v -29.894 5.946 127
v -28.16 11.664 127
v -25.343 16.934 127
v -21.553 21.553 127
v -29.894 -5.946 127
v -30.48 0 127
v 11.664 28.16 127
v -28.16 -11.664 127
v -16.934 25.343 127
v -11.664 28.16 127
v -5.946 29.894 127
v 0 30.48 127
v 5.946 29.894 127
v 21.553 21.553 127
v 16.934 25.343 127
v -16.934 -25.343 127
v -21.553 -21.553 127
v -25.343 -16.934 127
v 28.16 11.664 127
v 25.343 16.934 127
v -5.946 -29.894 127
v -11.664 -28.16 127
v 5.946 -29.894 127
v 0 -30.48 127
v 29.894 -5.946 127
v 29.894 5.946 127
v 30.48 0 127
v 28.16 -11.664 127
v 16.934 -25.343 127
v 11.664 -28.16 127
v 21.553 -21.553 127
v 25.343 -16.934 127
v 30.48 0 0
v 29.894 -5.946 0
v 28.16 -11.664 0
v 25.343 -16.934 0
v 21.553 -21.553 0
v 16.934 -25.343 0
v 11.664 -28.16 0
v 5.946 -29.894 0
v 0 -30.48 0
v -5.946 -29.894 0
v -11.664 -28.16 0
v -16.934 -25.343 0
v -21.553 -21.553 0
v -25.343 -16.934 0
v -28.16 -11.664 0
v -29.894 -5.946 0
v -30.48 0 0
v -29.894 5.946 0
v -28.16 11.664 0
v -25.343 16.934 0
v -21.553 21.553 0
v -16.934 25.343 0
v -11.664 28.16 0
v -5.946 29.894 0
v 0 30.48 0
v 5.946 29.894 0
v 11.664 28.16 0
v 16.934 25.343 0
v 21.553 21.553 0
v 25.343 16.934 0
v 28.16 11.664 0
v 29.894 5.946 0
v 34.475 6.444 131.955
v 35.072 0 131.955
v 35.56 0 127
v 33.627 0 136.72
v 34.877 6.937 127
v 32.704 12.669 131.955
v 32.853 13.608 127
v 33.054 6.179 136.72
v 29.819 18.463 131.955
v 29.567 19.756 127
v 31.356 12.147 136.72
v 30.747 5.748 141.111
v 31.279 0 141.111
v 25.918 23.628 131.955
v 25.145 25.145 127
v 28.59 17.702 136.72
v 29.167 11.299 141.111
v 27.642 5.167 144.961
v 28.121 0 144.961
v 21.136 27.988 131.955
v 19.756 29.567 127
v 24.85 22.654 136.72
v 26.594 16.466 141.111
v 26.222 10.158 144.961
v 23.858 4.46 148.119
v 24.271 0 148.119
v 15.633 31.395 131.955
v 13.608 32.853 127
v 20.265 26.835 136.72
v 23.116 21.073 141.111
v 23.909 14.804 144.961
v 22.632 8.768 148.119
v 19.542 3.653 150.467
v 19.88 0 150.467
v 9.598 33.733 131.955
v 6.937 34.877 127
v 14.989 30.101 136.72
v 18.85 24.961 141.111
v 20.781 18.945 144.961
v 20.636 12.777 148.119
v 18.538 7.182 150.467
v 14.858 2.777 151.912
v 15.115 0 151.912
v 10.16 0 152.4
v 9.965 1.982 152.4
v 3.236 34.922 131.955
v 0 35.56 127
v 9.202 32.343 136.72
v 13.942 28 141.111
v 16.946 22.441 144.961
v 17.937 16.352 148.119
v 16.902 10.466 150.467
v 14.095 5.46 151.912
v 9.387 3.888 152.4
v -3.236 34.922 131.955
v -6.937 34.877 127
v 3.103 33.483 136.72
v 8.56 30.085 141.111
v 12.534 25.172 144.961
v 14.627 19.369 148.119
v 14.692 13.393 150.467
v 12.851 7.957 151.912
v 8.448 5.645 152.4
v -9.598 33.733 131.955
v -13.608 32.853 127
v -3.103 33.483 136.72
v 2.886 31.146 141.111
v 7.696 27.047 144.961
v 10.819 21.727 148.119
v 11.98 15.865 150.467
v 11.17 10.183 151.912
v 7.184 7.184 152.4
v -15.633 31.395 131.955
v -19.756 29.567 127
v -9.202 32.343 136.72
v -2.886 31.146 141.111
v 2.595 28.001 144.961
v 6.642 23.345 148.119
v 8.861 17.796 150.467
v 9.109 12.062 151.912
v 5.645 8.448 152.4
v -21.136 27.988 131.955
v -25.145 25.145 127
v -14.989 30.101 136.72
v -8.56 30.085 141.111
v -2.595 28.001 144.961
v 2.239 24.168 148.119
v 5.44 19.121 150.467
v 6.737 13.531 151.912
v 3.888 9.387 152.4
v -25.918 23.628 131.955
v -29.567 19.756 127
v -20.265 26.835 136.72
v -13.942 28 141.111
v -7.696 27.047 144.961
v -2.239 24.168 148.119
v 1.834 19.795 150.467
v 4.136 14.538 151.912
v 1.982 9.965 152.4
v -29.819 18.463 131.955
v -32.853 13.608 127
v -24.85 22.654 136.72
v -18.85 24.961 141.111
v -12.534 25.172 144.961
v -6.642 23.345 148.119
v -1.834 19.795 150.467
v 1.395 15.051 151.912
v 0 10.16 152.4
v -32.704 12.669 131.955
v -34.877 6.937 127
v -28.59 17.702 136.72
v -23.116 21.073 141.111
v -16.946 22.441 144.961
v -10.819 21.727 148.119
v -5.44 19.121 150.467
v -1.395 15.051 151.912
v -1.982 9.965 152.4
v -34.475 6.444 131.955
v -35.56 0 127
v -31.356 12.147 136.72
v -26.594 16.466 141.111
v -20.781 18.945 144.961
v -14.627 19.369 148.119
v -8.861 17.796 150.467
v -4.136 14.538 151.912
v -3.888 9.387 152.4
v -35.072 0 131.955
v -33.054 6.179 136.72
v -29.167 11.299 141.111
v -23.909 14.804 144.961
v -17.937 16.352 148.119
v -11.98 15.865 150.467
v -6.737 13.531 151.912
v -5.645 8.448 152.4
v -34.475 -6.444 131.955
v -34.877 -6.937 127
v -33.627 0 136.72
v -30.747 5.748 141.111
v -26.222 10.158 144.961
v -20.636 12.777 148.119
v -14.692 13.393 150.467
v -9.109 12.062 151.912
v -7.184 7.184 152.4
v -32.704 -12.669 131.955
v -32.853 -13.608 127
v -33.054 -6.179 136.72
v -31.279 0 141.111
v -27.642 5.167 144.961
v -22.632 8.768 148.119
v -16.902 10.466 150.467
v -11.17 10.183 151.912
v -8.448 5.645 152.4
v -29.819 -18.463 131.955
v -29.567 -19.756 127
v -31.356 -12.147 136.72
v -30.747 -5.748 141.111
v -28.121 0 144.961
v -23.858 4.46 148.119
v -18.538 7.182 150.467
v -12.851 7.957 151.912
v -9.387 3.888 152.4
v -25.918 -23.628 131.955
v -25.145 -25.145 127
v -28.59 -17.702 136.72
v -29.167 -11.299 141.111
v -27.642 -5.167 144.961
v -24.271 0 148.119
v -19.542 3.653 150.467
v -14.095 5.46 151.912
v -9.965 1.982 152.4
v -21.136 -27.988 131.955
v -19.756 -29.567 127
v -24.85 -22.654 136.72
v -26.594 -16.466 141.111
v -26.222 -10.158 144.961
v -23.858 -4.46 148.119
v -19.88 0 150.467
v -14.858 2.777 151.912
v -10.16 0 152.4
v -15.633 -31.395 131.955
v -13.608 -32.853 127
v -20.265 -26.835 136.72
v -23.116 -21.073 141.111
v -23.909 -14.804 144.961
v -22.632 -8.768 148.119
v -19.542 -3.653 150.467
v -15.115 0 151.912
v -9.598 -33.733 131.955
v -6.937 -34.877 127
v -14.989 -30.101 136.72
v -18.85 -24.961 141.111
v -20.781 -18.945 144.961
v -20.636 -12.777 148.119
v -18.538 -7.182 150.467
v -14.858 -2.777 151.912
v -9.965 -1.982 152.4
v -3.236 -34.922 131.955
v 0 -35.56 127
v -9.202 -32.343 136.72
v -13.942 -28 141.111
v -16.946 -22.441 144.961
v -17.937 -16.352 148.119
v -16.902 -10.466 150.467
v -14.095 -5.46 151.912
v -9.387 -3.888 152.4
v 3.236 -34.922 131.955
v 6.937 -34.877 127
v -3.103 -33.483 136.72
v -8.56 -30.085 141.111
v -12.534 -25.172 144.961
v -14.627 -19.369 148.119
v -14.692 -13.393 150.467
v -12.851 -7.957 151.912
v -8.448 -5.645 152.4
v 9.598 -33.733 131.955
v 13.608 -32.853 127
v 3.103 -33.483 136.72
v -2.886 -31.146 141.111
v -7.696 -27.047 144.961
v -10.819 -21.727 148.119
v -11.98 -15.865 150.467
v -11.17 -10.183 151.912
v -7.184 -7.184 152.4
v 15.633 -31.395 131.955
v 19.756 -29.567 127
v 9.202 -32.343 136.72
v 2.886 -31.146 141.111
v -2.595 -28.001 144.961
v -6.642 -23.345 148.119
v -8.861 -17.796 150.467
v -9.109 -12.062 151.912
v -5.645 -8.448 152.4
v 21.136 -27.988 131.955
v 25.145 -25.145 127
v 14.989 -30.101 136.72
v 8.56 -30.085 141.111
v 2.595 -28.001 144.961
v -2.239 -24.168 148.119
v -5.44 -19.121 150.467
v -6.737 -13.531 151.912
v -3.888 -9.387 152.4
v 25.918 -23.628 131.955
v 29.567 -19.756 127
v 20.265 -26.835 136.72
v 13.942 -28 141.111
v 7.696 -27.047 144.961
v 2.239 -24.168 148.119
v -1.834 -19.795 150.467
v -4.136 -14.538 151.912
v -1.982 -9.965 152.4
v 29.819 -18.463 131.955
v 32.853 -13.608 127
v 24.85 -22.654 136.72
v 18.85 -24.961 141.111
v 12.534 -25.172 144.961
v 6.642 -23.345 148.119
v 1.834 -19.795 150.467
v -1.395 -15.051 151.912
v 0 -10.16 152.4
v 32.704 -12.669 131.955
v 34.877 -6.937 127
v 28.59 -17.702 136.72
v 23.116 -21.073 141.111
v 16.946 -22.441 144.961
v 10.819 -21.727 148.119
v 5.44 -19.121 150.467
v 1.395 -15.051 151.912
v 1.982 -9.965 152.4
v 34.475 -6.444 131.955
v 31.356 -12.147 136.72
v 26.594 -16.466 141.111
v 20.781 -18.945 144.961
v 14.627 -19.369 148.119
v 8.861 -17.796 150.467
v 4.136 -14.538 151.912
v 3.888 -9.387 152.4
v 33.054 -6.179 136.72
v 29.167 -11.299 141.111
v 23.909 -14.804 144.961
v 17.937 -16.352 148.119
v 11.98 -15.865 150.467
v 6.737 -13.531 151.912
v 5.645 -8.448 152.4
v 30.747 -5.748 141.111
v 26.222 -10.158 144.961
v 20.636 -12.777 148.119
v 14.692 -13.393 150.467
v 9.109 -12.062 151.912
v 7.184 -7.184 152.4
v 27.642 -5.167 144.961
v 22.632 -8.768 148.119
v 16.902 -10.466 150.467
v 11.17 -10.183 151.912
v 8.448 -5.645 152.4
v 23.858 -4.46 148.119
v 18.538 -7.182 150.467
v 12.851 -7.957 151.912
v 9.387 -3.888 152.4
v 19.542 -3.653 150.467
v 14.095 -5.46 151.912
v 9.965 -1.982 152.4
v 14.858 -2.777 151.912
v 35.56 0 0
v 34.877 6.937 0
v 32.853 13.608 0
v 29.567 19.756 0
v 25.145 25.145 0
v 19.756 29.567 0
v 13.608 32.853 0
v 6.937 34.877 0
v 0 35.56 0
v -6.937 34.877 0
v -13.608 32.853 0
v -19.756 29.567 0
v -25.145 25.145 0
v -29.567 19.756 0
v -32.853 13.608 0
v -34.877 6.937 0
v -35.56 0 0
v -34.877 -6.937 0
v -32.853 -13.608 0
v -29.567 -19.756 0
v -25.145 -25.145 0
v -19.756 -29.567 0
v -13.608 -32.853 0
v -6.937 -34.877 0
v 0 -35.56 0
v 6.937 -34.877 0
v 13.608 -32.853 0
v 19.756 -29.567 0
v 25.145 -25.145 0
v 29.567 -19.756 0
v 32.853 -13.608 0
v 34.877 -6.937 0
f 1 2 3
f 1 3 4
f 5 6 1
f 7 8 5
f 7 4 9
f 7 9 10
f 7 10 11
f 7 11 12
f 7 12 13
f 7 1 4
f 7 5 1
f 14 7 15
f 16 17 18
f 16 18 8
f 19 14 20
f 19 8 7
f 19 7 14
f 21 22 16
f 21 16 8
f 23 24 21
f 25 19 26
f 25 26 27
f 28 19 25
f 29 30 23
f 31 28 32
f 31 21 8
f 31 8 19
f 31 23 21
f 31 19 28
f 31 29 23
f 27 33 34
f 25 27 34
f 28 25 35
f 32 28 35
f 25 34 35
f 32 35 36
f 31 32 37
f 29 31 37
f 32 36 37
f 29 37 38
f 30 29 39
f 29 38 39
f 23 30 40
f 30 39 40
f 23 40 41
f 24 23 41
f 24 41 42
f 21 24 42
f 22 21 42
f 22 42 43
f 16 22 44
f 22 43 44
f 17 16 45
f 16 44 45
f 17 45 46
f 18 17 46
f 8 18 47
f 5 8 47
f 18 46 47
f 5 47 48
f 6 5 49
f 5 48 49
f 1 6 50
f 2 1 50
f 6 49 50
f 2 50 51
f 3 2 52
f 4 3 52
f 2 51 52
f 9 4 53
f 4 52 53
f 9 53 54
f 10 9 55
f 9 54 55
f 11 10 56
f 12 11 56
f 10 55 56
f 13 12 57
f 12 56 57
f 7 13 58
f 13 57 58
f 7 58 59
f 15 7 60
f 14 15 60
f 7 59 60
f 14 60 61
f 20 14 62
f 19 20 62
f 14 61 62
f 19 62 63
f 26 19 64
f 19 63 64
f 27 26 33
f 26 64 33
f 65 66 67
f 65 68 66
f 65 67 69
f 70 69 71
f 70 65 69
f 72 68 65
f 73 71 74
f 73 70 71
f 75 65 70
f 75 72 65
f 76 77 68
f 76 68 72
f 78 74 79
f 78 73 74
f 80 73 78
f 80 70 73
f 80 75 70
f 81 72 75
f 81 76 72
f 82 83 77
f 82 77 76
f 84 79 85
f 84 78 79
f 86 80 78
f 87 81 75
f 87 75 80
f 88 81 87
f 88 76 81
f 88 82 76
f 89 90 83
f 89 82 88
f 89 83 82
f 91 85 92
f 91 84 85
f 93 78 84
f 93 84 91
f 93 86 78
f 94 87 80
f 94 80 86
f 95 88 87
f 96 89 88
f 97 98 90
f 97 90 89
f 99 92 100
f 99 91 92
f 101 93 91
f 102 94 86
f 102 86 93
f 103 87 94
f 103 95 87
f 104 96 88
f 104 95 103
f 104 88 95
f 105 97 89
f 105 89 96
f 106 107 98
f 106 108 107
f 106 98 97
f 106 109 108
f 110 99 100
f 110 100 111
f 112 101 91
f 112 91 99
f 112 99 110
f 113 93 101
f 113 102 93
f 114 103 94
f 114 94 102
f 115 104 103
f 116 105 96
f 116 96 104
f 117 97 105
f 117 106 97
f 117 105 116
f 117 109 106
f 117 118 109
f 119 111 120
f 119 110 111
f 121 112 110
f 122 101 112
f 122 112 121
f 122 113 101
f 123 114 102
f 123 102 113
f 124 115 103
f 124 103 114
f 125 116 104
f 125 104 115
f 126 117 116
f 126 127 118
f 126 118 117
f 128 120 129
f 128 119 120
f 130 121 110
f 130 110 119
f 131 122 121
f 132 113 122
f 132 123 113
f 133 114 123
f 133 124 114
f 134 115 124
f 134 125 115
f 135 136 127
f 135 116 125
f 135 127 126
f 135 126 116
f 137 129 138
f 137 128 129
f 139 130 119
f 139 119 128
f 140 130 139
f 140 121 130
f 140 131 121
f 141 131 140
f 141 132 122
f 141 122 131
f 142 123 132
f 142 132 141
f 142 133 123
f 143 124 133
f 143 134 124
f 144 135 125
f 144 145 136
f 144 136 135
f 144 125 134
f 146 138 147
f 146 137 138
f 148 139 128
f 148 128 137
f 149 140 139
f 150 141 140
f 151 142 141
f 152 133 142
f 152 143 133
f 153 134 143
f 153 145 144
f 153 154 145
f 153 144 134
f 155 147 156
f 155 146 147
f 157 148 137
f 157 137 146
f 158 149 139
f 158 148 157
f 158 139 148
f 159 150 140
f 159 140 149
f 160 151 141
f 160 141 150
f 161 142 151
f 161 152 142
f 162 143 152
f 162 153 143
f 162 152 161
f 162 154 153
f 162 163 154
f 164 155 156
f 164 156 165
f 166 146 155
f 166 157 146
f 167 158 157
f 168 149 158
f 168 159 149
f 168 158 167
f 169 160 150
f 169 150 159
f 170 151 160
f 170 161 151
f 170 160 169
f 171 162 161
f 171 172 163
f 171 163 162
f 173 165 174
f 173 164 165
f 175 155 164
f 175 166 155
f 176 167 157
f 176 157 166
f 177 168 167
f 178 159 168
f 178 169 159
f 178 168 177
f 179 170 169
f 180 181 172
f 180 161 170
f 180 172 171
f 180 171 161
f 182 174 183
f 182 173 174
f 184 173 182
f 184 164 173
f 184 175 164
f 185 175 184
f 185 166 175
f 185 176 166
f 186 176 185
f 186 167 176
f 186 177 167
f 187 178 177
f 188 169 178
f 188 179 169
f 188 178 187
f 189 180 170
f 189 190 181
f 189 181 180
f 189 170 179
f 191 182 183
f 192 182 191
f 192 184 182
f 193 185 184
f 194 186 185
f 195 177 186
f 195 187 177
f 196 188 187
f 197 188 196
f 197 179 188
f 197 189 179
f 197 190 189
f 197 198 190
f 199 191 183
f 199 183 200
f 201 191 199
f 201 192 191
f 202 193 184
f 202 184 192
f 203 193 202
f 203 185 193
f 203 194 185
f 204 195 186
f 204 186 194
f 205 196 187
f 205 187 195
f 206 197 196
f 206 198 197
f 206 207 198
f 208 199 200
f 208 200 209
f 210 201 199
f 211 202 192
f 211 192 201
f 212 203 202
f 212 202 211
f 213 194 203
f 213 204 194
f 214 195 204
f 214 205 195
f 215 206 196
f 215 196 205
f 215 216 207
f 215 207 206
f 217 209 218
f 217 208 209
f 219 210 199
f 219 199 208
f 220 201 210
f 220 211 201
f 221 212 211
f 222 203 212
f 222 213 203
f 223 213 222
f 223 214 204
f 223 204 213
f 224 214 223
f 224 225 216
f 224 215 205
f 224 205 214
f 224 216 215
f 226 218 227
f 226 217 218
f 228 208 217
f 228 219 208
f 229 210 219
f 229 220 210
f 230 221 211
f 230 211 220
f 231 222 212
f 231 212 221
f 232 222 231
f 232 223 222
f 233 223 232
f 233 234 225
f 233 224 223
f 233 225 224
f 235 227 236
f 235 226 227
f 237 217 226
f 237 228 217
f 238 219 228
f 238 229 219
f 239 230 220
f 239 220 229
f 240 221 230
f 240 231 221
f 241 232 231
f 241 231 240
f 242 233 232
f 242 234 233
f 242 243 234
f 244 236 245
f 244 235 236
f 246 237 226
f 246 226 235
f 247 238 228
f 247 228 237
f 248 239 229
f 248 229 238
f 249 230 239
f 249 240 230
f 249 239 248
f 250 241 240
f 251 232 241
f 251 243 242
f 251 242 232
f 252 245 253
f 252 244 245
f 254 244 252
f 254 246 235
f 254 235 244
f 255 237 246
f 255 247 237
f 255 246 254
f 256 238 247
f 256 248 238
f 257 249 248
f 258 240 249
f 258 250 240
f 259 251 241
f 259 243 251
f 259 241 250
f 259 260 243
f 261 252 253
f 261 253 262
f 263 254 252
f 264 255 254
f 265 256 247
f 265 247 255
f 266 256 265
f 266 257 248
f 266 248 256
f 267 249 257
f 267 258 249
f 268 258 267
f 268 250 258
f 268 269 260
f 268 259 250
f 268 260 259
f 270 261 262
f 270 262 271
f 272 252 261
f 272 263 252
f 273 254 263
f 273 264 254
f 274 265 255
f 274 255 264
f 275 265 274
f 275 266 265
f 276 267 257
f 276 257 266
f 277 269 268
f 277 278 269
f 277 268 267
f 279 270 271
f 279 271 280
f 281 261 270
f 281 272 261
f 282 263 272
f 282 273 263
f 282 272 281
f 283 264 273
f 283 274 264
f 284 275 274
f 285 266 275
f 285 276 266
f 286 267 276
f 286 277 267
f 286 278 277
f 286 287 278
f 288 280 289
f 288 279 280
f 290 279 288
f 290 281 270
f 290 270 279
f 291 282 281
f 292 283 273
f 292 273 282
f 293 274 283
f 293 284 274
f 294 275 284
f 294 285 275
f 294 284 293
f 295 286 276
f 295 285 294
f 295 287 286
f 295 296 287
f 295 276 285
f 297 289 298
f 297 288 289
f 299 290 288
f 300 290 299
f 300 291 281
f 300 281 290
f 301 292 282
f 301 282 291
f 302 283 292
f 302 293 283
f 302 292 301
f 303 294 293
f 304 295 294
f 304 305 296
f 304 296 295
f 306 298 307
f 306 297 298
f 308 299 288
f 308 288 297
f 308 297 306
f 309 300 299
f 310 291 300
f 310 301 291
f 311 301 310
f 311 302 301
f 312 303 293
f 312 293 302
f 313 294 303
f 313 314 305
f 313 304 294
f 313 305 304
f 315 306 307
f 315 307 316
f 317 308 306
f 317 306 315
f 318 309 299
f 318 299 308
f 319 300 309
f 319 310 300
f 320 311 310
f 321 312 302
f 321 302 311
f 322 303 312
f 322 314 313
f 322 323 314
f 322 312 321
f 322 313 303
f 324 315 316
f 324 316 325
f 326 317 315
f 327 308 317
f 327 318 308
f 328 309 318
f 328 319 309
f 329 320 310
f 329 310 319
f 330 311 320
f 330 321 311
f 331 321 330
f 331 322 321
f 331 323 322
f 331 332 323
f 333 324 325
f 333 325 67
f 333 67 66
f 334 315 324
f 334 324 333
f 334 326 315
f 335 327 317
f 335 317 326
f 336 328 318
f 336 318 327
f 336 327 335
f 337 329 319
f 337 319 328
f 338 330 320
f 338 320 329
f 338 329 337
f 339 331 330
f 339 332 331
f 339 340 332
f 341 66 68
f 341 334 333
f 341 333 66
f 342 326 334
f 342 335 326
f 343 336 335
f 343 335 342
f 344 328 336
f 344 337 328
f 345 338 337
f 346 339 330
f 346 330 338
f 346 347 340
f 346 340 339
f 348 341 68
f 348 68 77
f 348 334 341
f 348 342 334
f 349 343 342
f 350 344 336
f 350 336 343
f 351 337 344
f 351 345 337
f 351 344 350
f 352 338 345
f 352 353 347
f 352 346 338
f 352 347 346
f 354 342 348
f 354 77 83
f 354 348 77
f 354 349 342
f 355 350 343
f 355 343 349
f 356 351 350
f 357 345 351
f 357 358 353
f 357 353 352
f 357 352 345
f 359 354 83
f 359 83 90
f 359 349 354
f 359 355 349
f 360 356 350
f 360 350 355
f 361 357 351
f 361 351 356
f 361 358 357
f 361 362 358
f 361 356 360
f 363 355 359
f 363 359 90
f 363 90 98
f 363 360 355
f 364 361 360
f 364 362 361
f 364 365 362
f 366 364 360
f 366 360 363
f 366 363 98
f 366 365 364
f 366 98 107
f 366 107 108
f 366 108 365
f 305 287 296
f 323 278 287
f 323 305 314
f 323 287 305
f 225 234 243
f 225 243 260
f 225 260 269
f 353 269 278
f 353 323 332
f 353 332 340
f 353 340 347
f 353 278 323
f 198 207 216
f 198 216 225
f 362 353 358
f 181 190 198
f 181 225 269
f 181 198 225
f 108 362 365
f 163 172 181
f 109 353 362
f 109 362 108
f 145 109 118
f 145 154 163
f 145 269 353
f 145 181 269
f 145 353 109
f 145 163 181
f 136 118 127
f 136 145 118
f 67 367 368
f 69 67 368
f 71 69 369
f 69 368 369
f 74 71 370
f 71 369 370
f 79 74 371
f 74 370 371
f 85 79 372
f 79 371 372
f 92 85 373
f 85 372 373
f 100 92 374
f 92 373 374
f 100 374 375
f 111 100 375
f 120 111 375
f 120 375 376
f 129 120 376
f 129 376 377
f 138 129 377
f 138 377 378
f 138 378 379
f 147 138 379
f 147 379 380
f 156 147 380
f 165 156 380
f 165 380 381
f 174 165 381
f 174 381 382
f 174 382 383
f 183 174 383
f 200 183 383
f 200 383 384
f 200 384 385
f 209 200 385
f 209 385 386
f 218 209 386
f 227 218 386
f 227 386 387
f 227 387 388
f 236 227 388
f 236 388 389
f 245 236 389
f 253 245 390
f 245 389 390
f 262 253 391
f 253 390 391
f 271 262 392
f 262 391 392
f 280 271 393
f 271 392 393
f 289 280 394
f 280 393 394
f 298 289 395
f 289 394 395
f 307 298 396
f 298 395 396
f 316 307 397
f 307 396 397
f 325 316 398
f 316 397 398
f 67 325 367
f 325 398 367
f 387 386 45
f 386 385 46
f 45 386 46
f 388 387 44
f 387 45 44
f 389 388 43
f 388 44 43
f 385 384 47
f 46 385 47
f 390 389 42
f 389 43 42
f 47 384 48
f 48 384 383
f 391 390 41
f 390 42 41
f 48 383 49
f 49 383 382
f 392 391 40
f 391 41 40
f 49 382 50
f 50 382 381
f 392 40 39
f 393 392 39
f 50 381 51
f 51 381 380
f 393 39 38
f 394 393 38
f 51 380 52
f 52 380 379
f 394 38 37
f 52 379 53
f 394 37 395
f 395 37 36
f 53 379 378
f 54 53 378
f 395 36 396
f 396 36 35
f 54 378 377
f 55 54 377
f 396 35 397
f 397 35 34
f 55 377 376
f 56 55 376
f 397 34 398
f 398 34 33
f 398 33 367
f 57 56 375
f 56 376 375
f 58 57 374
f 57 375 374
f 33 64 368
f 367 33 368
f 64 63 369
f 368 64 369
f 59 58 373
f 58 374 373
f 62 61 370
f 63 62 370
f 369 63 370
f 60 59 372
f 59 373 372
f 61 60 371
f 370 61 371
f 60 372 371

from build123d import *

# Parameters (mm, degrees)
F0_R     = 35.56
F1_DEPTH = 127
F2_DEPTH = 25.4
F3_R     = 25.4
F4_R     = 30.48
F5_DEPTH = 127


with BuildPart() as f1:
    # F0 (on Top) → F1 (new body)
    with BuildSketch(Plane.XY):
        Circle(F0_R)
    extrude(amount=F1_DEPTH)

    # F2 (add): a face of the model
    f2_faces = [f1.faces().sort_by_distance(p)[0] for p in [
        (0, 0, 127),
    ]]
    extrude(f2_faces, amount=F2_DEPTH)

    # F3
    f3_edges = [f1.edges().sort_by_distance(p)[0] for p in [
        (-35.56, 0, 152.4),
    ]]
    fillet(f3_edges, radius=F3_R)

    # F4 (on face) → F5 (cut)
    with BuildSketch(Plane(origin=(0, 0, 0), x_dir=(1, 0, 0), z_dir=(0, 0, -1))):
        Circle(F4_R)
    extrude(amount=-F5_DEPTH, mode=Mode.SUBTRACT)


solid = f1.part
